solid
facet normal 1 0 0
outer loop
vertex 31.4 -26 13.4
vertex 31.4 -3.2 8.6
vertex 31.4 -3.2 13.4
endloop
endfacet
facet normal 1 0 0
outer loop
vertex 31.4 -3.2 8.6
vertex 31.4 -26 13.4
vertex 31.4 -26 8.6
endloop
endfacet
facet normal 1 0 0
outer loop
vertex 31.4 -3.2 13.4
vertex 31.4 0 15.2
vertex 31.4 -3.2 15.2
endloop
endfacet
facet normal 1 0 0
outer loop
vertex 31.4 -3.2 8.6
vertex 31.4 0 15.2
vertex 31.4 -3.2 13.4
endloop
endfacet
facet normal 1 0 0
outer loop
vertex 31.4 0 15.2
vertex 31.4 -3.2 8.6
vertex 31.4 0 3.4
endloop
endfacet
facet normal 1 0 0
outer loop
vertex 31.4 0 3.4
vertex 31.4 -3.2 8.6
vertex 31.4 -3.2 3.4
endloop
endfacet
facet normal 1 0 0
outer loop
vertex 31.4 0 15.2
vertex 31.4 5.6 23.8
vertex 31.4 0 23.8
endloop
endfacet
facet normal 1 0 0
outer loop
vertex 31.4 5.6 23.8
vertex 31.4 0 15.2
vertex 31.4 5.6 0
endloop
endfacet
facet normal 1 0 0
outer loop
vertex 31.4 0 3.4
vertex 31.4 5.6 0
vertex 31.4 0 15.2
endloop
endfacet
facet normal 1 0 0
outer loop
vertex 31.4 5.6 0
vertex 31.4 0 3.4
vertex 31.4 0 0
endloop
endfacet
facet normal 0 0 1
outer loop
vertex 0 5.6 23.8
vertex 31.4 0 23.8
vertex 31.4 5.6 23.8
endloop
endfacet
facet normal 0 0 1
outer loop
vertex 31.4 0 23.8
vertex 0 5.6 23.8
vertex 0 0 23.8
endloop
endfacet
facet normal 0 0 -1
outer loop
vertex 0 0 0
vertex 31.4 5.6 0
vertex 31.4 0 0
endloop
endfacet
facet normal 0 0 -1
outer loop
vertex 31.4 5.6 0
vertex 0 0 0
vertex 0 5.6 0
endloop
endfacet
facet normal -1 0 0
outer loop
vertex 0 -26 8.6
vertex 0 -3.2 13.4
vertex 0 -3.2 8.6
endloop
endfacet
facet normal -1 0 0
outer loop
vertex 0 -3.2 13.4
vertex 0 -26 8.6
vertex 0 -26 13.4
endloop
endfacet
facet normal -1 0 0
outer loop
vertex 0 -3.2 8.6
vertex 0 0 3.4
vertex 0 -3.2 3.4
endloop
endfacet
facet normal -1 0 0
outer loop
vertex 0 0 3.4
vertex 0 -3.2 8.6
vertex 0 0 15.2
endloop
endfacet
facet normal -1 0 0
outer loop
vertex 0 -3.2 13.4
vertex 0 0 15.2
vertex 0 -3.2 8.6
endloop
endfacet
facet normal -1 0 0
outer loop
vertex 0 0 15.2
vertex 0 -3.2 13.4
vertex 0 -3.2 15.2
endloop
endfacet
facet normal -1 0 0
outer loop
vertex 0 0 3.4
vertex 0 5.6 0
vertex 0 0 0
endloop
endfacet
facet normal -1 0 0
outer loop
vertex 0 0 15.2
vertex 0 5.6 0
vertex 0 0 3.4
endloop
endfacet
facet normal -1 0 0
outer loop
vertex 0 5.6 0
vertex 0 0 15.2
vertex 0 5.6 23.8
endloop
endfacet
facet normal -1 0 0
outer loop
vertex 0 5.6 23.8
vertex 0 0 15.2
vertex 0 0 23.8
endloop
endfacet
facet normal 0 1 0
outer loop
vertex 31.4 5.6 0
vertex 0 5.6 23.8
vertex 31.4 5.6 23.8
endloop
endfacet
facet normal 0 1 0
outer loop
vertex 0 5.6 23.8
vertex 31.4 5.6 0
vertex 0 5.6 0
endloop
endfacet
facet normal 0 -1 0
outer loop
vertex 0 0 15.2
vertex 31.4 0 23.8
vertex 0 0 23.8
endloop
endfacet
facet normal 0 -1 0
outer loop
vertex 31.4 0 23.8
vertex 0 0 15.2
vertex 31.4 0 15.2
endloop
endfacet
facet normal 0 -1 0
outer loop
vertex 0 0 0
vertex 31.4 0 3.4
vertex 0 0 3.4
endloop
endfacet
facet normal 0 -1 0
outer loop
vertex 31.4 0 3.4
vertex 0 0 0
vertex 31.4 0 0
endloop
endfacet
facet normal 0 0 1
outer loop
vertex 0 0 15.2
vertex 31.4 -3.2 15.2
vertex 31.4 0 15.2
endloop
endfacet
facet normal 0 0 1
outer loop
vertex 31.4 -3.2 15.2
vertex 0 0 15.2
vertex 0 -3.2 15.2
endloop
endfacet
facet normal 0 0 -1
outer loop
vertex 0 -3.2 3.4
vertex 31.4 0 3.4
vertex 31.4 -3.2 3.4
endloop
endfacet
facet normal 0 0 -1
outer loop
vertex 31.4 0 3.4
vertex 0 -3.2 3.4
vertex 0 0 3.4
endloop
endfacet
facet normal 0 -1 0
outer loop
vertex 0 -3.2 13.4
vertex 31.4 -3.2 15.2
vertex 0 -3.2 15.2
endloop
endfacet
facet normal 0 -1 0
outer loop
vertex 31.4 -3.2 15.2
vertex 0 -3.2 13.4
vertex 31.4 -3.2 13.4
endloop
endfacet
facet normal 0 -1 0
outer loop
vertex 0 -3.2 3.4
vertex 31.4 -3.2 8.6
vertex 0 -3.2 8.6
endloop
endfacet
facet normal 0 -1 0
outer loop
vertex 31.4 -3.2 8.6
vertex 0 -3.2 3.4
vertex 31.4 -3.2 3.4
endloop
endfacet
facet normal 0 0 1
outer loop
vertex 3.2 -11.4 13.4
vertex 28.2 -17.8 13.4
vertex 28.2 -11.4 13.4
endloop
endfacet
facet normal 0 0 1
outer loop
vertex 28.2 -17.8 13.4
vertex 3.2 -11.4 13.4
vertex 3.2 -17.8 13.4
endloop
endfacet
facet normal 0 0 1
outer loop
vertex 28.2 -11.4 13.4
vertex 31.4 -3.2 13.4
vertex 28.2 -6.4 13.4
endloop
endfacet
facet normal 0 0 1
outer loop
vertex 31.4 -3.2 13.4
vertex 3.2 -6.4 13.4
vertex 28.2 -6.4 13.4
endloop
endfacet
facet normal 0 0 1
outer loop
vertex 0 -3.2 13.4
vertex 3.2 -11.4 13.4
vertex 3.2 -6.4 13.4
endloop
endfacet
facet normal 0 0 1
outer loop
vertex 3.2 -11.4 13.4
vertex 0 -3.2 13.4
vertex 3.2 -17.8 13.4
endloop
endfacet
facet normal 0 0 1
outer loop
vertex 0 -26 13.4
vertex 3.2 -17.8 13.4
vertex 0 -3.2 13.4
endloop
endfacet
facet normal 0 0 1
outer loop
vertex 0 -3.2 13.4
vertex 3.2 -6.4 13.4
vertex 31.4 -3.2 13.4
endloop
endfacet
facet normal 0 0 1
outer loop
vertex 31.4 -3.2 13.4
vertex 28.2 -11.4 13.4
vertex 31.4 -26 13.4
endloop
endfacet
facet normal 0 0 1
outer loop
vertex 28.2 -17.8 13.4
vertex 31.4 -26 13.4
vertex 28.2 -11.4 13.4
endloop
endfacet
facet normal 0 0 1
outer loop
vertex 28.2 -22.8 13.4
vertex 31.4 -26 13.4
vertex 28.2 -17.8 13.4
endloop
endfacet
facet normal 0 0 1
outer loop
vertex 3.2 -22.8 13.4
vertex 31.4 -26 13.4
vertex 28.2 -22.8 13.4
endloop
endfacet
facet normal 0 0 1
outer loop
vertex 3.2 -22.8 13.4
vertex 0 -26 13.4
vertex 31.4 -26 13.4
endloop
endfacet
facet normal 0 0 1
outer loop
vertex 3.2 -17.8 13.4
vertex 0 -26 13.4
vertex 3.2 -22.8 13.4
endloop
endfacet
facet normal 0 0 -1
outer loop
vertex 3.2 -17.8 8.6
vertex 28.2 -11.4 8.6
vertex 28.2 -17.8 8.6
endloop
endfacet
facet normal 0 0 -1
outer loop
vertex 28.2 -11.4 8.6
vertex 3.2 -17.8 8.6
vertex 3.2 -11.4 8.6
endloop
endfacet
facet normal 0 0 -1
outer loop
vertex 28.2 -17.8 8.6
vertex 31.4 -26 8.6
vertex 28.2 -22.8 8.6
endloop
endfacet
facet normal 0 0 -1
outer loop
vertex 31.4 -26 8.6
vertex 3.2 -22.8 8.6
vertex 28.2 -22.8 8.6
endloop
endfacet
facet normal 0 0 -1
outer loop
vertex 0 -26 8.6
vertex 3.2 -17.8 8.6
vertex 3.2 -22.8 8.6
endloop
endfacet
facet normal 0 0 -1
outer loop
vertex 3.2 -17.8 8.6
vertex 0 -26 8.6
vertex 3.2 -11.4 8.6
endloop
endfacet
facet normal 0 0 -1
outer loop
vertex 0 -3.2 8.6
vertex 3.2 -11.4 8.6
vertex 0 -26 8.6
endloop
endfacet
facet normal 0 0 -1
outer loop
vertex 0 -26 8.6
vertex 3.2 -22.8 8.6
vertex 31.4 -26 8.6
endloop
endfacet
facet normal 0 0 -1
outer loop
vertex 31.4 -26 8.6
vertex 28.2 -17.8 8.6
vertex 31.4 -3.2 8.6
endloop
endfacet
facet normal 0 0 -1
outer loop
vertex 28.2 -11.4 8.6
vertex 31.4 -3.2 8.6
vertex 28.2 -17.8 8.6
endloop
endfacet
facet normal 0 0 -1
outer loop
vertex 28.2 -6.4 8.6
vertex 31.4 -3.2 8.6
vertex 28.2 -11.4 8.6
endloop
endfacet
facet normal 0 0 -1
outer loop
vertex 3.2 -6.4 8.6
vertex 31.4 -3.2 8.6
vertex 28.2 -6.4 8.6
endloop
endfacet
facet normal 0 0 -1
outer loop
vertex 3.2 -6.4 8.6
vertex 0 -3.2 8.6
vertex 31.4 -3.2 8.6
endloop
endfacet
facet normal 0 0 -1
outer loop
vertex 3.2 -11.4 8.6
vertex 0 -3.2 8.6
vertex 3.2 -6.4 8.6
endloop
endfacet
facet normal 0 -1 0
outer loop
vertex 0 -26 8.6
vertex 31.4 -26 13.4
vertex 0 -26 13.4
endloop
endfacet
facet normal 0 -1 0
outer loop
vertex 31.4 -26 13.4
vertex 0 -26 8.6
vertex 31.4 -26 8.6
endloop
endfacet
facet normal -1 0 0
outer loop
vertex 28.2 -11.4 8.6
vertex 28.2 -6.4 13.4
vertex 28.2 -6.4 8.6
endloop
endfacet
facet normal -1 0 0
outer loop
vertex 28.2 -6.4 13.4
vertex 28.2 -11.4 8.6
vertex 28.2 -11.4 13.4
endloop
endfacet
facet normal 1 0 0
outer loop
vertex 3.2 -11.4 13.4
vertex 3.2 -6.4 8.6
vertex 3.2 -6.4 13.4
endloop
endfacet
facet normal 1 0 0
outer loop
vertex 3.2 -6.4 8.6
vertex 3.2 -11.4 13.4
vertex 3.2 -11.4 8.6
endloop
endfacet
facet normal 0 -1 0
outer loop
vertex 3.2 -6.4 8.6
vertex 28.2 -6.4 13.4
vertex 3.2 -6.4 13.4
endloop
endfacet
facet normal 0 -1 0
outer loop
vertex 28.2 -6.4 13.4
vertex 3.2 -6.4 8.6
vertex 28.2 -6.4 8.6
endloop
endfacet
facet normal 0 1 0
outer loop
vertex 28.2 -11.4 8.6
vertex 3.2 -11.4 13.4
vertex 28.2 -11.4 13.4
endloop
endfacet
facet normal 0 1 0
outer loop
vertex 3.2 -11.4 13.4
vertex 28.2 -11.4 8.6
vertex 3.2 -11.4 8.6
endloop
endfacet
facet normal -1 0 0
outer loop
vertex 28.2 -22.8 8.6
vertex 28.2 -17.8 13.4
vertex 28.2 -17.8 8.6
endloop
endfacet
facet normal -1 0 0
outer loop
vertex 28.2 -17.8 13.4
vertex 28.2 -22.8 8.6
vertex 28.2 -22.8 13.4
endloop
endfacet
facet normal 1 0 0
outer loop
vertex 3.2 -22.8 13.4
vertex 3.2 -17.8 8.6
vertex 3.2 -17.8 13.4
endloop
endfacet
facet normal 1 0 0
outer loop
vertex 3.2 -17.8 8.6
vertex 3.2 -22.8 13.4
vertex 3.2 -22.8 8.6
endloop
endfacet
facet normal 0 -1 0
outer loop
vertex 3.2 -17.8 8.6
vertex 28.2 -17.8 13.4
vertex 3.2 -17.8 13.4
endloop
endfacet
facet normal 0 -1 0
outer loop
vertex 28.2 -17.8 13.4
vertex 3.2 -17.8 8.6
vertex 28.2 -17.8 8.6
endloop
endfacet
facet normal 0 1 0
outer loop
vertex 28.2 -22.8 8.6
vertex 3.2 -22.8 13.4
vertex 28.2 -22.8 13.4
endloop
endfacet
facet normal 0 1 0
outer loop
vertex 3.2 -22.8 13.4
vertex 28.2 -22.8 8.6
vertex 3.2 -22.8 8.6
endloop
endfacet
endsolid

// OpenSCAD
/* [Module type] */

// Type of the module you want to create
ModuleType="plateWithRectHoles"; // [Fixture, plateForTube, plateWithRectHoles]

/* [Common values for all modules types] */

// Height of the fixture
FixHeight=30; // [10:100]

// Depth of the fixture
FixDepth=12;  // [10:100]

// Tichness of the fixture (dans modules)
FixThickness=3.2; // [2:6]

// space between male and female parts in the fixture (between 0.1 and 0.4)
loose=0.2;

/* [Fixture module parameters] */

// diameter of the hole where you insert the screws
FixAnchorHoles=3.6; // [1:6]

// length of the fixture
FixLength=150;  // [20:300]


/* [plateForTube parameters] */
// Diameter of the container
PlateForTubeDiam=90; // [20:150]

// Depth of the tube 
PlateForTubeDepth=60; // [1:150]

// Tube resolution
PlateForTubeResolution=360; // [3:360]


/* [plateWithRectHole parameters] */
// Hole dim X
PlateWithRectHoleX=25; // [1:100]

// Hole dim Y
PlateWithRectHoleY=5; // [1:100]

// number of holes
PlateWithRectHoleQt=2; // [1:10]

/* [Hidden] */
screwPos1=FixLength * 0.25;
screwPos2=FixLength * 0.75;

base();

module base()
{
	if(ModuleType == "Fixture")
		rotate([0,-90,0]) fixture(length=FixLength, height=FixHeight, width=FixDepth, thickness=FixThickness);

	if(ModuleType == "plateForTube")
		rotate([-90,-90,0]) plateForTube(diam=PlateForTubeDiam + loose*2, depth=PlateForTubeDepth);

	if(ModuleType == "plateWithRectHoles")
		/*rotate([0,-90,0])*/ plateWithRectHoles(holeX=PlateWithRectHoleX, holeY=PlateWithRectHoleY, qtHoles=PlateWithRectHoleQt); 

}


module fixture(length=100, width=10, height=25, thickness=2.4)
{
	screwPos1=FixLength * 0.25;
	screwPos2=FixLength * 0.75;

	// fixture body
	difference()
	{
		cube([length, width,height]);
		union()
		{
			translate([-1,thickness,thickness]) cube([length+2, width - thickness * 2, height - thickness * 2]);
			translate([-1, -1, thickness * 2]) cube([length + 2, thickness * 2, height - thickness * 4]);
		}
	}
	
	// fixture anchors
	union()
	{
		difference()
		{
			translate([screwPos1 - 5, width - thickness, height]) cube([10, thickness, 10]);
			translate([screwPos1, width+1, height+5]) rotate([90,0,0]) cylinder(h=thickness+2, d=FixAnchorHoles, center=false, $fn=PlateForTubeResolution);
		}
		difference()
		{
			translate([screwPos2 - 5, width - thickness, height]) cube([10, thickness, 10]);
			translate([screwPos2, width+1, height+5]) rotate([90,0,0]) cylinder(h=thickness+2, d=FixAnchorHoles, center=false, $fn=PlateForTubeResolution);
		}
	}
}

module plateForTube(diam, depth)
{
	zpos=-(((depth+FixThickness*2) - ((FixHeight/2) - (FixThickness*2)) - FixThickness*1.5) - FixThickness);
	difference()
	{
		union()
		{
			insert(length=diam+FixThickness*2, stripLength=diam+FixThickness*3);
			translate([((diam+FixThickness*2)/2),
				-(((diam+FixThickness*2)/2)+FixThickness*2), 
				-((depth+FixThickness*2) - ((FixHeight/2) - (FixThickness*2)) - FixThickness*1.5)]) 
					cylinder(h=depth+FixThickness*2, d=diam+FixThickness*2, $fn=PlateForTubeResolution);
		}
		translate([diam/2 +FixThickness, -(diam/2 + FixThickness*3), zpos]) 
			cylinder(h=depth+FixThickness*2, d=diam, $fn=PlateForTubeResolution);
		translate([diam +FixThickness, -(diam/2 + FixThickness*3 ), zpos ])
			cylinder(h=depth-FixThickness, d=diam, $fn=PlateForTubeResolution);
		translate([FixThickness, -(diam/2 + FixThickness*3 ), zpos])
			cylinder(h=depth-FixThickness, d=diam, $fn=PlateForTubeResolution);
	}
	
}

module plateWithRectHoles(holeX, holeY, qtHoles=1)  
{
	difference()
	{
		insert(length=holeX + FixThickness * 2, stripLength=(holeY + FixThickness * 2) * qtHoles);
		for(curHole=[1:qtHoles])
			translate([FixThickness, 
					-((holeY+(FixThickness*2)) * curHole), 
					((FixHeight/2) - (FixThickness*2))-1]) 
				cube([holeX, holeY, FixThickness * 2]);
	}
}
module insert(length, stripLength=4)
{
	union()
	{
		color("red") cube([length, (FixDepth - (FixThickness * 2)) , FixHeight - ((FixThickness * 2) - loose)]);
		color("orange") translate([0, -(FixThickness), FixThickness + loose]) cube([length, FixThickness, (FixHeight - (FixThickness * 2)) /2 ]);
		color("yellow") translate([0,-((FixThickness * 2) + (stripLength - FixThickness)), (FixHeight/2) - (FixThickness*2)]) 
			cube([length, stripLength, FixThickness*1.5]);
	}
}
